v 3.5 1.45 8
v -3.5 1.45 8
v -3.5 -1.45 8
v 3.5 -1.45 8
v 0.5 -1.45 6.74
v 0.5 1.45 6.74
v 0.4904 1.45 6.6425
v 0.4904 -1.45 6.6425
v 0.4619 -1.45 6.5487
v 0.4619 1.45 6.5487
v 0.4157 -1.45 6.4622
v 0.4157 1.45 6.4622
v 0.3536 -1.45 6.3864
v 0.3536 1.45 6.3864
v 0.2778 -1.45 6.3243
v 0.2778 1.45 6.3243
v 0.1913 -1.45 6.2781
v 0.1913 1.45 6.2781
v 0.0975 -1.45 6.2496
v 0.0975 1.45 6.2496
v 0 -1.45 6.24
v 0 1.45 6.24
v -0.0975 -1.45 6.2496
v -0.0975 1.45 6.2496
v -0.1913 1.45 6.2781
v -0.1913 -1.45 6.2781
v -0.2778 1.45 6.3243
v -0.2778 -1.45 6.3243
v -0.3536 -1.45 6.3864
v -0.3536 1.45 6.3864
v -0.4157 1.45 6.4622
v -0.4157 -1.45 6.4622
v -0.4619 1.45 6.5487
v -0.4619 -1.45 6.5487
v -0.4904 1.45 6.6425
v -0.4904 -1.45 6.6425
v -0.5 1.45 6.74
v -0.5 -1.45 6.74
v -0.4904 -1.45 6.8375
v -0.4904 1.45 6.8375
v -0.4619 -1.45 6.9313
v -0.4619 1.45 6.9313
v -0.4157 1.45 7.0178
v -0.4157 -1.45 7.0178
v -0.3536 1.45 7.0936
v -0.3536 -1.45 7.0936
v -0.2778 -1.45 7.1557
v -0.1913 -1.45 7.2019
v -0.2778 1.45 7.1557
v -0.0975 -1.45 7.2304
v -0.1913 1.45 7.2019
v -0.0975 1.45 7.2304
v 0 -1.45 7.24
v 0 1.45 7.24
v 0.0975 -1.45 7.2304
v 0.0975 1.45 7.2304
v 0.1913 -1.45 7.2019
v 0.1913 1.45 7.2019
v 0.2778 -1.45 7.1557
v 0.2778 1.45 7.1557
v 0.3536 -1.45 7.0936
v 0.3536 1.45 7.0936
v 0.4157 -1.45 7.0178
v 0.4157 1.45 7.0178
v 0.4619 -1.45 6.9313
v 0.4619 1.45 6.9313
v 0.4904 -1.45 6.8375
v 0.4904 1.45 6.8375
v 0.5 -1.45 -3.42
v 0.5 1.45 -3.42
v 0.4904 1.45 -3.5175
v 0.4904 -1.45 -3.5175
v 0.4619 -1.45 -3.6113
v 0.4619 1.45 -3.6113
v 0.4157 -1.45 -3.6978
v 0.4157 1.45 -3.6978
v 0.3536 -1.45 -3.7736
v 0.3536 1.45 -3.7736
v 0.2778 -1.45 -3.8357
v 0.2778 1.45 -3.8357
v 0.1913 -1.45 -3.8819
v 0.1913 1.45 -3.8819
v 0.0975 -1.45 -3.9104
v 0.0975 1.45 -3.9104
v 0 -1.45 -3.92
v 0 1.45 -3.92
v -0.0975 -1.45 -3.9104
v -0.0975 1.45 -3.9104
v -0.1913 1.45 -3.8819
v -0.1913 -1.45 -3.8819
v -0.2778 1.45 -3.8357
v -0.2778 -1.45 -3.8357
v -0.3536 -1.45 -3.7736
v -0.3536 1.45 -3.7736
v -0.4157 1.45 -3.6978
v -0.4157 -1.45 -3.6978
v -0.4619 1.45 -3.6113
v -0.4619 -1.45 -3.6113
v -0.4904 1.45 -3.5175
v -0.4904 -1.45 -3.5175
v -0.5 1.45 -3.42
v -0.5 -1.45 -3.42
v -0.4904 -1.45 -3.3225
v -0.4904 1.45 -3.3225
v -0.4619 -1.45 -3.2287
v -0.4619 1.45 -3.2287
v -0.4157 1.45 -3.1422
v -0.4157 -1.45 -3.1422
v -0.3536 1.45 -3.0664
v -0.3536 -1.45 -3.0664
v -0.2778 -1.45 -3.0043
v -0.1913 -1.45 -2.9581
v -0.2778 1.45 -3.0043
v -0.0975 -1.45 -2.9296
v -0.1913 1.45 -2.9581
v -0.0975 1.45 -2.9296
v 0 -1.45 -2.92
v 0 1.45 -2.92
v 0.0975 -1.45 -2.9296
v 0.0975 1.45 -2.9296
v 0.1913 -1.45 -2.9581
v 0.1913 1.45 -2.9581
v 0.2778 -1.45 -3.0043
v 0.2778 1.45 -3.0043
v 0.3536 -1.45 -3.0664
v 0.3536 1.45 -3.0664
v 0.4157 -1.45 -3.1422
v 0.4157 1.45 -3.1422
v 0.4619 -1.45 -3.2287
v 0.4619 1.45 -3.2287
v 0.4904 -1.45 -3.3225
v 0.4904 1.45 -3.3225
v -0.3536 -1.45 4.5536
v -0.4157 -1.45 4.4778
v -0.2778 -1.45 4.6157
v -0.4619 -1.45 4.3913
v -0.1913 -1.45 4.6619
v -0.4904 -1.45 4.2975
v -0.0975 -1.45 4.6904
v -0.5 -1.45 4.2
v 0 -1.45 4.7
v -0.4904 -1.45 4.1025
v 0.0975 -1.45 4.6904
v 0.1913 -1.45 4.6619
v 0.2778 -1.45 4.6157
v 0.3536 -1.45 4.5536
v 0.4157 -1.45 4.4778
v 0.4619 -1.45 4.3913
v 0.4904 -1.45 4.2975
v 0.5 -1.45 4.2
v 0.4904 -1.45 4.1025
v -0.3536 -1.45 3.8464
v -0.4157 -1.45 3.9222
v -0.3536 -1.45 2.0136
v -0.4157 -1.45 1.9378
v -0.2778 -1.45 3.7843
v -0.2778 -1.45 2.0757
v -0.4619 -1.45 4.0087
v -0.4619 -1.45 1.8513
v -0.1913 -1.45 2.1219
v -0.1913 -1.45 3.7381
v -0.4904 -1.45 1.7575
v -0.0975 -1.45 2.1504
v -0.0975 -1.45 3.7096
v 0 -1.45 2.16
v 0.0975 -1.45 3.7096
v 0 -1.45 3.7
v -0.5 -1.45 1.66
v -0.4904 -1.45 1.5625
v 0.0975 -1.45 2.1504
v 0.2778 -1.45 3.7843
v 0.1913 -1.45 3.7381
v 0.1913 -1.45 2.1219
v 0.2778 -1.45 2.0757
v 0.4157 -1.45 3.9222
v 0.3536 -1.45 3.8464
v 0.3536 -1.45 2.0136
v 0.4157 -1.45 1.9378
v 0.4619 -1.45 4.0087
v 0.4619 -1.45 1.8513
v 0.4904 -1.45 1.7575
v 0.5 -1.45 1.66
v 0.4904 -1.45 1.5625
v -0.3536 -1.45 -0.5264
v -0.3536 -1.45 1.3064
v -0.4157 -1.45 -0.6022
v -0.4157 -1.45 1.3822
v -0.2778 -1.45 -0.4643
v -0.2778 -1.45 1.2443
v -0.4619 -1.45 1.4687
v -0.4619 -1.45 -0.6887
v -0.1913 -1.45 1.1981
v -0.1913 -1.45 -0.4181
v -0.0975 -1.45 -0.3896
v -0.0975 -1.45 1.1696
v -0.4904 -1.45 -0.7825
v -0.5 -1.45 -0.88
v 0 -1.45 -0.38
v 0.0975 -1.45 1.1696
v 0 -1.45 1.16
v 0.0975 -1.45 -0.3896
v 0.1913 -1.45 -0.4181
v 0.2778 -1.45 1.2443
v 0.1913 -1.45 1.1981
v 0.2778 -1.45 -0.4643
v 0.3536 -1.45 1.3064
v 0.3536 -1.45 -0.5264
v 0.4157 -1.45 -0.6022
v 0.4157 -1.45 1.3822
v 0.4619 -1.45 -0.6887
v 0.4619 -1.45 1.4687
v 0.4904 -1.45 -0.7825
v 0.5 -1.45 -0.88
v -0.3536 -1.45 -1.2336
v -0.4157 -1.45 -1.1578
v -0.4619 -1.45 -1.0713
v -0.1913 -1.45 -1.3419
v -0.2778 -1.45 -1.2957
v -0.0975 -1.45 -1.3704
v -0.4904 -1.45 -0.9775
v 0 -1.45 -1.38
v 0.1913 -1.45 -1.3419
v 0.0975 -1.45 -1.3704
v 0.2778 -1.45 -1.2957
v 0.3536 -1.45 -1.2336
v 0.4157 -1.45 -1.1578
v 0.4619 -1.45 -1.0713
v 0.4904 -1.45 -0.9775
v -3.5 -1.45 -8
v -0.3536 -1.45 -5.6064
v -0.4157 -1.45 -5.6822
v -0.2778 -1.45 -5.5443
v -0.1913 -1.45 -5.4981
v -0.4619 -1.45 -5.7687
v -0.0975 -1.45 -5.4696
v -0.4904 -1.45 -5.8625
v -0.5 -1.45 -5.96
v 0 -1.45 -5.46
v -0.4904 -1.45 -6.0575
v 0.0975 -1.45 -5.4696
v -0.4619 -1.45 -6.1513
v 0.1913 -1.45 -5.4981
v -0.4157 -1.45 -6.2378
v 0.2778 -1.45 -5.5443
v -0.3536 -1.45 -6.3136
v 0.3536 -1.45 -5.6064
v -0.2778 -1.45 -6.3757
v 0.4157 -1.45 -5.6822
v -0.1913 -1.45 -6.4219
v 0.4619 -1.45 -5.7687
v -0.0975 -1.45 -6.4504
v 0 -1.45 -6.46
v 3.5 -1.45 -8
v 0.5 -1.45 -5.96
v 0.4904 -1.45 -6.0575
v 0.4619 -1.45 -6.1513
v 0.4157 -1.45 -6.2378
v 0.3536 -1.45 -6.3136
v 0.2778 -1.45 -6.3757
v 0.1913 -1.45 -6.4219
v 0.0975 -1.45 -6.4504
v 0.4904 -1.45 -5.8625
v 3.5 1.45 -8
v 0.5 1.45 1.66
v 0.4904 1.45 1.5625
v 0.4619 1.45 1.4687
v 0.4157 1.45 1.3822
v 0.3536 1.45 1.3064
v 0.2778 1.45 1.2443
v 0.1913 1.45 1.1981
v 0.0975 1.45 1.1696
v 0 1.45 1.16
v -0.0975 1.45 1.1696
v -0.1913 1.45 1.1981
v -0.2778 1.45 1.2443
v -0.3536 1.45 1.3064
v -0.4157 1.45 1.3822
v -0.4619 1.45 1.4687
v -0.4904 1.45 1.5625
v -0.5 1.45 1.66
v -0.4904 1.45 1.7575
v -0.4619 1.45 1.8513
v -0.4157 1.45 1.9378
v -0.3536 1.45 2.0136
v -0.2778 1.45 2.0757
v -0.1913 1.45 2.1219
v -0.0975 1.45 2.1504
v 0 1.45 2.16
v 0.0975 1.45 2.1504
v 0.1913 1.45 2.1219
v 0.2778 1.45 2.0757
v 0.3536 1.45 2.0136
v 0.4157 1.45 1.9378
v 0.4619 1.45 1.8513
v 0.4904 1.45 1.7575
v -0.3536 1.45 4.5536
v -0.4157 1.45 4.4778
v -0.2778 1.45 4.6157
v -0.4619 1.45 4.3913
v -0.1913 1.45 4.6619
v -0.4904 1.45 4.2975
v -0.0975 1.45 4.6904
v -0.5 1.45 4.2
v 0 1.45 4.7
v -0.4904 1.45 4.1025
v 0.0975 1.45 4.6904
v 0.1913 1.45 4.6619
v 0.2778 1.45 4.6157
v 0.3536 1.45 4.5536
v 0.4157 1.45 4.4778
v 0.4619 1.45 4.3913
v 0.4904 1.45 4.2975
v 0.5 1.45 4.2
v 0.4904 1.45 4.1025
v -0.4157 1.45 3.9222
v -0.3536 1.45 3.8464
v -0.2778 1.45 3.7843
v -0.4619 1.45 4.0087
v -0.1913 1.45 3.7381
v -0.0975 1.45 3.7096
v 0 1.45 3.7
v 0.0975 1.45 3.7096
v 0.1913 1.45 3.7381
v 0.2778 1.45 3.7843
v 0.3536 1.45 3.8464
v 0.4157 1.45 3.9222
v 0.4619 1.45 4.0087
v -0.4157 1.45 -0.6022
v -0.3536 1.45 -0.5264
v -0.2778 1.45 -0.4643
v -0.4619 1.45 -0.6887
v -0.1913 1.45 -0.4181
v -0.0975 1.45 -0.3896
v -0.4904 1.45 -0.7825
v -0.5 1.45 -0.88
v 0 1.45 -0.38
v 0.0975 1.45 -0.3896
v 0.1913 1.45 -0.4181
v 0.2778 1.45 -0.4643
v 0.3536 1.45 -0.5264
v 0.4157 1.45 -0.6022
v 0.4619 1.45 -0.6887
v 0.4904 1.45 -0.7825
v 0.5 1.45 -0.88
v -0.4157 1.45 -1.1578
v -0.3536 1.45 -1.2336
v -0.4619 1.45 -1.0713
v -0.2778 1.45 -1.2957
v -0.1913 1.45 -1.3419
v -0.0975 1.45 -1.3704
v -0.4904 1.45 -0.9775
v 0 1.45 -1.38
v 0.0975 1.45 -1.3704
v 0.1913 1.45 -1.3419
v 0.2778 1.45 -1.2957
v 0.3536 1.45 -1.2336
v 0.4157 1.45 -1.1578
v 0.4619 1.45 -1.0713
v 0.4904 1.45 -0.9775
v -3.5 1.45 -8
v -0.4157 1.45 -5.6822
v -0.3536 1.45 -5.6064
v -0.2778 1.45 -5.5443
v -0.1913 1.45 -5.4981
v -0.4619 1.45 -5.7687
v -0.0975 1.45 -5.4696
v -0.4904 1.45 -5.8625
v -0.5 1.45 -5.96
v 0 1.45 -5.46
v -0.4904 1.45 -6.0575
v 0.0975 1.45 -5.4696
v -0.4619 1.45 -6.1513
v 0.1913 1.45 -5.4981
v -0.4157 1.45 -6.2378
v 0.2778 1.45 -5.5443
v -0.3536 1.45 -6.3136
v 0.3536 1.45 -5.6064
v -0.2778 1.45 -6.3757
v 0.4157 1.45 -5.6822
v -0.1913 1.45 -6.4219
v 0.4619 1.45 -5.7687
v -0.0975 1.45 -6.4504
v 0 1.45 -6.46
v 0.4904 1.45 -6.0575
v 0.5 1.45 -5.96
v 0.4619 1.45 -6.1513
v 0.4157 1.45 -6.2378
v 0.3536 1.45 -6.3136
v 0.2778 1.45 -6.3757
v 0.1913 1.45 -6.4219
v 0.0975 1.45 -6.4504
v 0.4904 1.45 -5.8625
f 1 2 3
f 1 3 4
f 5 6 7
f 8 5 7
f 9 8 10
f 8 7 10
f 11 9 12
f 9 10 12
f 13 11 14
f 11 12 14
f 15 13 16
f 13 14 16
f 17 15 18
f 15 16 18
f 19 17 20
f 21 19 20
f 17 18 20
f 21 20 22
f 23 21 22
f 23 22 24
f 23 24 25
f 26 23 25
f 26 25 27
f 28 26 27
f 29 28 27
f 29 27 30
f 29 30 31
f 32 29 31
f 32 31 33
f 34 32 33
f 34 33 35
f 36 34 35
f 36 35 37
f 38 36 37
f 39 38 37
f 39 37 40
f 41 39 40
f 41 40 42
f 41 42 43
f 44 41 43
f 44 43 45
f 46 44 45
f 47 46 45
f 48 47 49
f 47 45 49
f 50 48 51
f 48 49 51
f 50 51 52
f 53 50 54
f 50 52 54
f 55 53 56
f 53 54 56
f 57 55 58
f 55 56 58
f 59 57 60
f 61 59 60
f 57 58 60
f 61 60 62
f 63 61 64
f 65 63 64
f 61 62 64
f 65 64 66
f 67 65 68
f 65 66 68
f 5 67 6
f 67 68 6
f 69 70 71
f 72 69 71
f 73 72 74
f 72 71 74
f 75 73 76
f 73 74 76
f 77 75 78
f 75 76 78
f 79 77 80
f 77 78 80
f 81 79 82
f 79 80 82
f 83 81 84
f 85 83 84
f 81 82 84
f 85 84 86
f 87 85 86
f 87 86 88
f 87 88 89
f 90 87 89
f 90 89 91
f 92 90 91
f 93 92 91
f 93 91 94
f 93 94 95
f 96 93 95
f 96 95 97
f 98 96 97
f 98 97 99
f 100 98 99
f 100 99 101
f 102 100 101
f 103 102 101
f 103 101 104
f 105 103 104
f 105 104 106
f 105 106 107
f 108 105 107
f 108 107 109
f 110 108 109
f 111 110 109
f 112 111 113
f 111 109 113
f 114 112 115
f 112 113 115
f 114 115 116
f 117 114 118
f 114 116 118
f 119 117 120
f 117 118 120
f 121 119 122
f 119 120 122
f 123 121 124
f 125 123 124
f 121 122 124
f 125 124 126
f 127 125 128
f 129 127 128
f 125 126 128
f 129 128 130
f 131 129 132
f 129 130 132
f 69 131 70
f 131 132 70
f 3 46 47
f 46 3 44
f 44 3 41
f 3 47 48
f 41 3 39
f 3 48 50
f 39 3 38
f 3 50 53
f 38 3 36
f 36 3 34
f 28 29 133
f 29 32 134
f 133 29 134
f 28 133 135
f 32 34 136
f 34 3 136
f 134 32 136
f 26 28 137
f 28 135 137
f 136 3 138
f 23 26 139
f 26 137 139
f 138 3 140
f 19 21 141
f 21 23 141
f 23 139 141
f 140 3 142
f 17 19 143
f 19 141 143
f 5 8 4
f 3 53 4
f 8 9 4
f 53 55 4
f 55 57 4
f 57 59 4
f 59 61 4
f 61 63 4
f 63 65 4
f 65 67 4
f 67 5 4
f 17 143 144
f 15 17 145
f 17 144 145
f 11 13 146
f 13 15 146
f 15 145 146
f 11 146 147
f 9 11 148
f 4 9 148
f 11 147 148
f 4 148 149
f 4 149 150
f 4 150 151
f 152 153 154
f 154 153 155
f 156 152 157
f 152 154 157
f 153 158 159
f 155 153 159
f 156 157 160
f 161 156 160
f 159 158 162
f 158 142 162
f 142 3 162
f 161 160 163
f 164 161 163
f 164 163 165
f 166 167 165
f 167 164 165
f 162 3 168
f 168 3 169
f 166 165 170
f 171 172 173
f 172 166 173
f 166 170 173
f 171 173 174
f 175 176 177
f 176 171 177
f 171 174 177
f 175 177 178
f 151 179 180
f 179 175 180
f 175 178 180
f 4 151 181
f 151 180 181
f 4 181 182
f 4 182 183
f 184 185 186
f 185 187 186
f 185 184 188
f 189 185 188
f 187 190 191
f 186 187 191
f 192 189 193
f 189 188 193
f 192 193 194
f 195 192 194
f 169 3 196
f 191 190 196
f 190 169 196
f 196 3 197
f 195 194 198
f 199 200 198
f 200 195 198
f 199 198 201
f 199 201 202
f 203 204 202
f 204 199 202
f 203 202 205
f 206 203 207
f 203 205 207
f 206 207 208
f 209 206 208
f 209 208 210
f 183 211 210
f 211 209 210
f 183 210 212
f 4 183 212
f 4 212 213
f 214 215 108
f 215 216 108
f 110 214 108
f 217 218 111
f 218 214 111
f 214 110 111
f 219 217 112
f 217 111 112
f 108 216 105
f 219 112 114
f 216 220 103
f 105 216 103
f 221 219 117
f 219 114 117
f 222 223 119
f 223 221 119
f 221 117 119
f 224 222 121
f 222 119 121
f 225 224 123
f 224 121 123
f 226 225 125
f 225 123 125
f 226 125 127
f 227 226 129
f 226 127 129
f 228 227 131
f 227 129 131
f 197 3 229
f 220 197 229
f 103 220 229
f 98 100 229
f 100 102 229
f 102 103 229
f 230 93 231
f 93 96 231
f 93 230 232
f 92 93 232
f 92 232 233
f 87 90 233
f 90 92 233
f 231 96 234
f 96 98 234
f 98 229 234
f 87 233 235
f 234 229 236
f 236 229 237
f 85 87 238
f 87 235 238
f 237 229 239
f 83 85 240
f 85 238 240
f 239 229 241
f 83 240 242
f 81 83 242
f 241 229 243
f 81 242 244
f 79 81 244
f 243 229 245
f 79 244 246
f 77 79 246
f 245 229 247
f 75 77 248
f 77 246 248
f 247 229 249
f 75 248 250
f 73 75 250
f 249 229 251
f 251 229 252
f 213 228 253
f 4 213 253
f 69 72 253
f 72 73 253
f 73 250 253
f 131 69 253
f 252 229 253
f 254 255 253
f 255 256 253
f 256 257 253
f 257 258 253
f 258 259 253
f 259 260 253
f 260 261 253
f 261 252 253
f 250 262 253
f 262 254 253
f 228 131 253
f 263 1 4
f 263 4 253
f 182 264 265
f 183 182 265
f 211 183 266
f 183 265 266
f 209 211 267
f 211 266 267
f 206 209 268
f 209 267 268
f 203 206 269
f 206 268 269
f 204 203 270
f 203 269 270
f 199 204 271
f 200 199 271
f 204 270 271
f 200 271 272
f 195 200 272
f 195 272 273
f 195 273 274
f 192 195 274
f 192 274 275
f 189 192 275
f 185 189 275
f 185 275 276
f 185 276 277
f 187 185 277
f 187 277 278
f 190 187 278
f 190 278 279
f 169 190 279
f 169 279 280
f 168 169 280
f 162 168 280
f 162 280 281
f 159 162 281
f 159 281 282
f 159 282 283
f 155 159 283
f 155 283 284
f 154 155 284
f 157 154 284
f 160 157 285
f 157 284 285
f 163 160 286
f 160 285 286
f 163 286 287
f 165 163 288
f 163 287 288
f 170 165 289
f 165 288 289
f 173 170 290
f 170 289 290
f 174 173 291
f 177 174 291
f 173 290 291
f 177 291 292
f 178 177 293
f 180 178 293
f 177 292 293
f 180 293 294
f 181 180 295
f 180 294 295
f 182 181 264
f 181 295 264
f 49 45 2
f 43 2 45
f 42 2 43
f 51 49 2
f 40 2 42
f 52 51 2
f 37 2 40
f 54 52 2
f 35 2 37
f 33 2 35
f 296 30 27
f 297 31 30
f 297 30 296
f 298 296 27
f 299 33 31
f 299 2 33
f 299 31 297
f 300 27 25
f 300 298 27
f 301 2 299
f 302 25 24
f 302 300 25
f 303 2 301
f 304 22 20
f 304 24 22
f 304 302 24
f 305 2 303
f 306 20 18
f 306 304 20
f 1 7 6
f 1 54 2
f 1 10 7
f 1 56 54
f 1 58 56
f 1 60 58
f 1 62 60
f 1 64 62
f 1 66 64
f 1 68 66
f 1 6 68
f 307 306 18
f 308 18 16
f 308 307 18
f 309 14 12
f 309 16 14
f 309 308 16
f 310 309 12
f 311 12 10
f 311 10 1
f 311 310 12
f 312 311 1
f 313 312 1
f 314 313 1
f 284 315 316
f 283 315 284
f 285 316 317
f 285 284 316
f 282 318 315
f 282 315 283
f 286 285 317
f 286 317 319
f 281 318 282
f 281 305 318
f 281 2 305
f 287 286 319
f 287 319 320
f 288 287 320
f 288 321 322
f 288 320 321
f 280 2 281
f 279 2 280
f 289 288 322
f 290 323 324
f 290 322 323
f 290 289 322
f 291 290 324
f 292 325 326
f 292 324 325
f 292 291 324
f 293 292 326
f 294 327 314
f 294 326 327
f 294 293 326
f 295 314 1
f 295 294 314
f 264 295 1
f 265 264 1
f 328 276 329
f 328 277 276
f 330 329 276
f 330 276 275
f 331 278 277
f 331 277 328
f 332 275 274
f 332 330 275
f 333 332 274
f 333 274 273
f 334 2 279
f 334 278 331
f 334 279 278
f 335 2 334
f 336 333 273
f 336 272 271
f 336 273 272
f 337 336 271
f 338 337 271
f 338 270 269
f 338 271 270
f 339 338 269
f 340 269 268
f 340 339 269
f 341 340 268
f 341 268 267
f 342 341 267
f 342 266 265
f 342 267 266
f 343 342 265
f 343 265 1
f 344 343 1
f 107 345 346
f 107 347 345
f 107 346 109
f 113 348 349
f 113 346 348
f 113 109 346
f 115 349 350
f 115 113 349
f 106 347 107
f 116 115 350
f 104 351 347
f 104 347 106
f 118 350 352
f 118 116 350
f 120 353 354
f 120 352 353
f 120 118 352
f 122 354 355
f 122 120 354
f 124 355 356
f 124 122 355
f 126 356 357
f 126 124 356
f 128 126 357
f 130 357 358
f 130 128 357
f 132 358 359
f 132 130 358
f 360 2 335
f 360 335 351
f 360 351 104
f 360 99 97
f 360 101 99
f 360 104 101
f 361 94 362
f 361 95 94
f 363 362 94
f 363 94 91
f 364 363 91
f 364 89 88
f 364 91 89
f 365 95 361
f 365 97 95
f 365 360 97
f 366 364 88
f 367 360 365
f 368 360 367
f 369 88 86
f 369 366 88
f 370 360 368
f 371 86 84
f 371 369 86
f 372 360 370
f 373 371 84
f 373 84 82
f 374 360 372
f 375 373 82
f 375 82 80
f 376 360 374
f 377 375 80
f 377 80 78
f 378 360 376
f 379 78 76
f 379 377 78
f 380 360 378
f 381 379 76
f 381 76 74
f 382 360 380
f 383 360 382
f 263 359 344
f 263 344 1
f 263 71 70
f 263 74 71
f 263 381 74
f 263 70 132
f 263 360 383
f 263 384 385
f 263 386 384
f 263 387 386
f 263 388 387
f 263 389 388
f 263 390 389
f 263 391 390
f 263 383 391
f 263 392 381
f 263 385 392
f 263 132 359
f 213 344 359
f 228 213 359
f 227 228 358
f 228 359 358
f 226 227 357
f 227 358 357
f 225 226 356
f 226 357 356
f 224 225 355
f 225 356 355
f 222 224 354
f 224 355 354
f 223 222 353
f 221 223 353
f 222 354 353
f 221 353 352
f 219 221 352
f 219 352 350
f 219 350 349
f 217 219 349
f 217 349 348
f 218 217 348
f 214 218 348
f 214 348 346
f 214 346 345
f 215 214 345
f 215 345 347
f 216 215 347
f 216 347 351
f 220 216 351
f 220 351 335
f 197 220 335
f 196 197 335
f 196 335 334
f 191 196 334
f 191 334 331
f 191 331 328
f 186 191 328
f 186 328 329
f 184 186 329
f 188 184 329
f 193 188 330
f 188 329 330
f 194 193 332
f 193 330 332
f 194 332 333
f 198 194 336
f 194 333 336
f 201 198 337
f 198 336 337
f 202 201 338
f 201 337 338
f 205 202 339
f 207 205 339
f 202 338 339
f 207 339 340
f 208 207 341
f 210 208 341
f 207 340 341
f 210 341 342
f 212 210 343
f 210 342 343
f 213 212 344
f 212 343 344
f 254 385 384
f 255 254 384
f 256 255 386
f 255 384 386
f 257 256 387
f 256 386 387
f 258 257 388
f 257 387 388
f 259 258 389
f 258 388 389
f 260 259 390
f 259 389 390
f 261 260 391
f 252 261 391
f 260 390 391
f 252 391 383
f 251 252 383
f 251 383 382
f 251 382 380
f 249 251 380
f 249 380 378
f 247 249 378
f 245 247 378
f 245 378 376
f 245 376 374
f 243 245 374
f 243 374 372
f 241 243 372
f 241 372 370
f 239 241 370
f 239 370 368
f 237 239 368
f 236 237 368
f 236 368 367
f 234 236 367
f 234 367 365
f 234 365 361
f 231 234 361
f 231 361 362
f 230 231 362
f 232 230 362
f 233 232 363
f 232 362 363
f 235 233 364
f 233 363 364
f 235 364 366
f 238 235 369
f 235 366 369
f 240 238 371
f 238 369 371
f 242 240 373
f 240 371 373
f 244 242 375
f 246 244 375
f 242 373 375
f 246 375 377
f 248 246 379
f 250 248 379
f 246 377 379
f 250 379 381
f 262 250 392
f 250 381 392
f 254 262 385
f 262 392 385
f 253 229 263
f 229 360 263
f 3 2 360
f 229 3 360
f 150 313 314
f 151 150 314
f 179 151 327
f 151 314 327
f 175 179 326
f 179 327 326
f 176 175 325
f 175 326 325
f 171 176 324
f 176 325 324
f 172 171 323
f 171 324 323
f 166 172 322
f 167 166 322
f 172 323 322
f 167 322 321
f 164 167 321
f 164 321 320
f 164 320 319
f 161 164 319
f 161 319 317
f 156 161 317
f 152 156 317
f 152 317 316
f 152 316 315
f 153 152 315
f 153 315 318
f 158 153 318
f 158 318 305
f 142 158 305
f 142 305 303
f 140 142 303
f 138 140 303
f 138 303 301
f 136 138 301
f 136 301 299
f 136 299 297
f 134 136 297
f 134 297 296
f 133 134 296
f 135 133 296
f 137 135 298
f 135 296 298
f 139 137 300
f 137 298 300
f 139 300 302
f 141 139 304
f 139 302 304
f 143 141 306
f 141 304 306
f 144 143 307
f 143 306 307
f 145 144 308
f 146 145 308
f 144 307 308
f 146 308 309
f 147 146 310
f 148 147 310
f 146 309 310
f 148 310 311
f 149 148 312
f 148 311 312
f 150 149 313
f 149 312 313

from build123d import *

# Parameters (mm, degrees)
SKETCH1_W           = 7
SKETCH1_H           = 16
BOSS_EXTRUDE1_DEPTH = 1.45
SKETCH2_R           = 0.5
CUT_EXTRUDE1_DEPTH  = 3.9
LPATTERN1_COUNT     = 12
LPATTERN1_PITCH     = 2.54


with BuildPart() as part:
    # Sketch1 → Boss-Extrude1 (new body, symmetric)
    with BuildSketch(Plane(origin=(0, 0, 0), x_dir=(1, 0, 0), z_dir=(0, 1, 0))):
        Rectangle(SKETCH1_W, SKETCH1_H)
    extrude(amount=BOSS_EXTRUDE1_DEPTH, both=True)

    # Sketch2 → Cut-Extrude1 (cut, through all)
    with BuildSketch(Plane(origin=(0, 1.45, 0), x_dir=(1, 0, 0), z_dir=(0, 1, 0))):
        with Locations((0, 5.96)):
            Circle(SKETCH2_R)
    cut_extrude1 = extrude(amount=-CUT_EXTRUDE1_DEPTH, mode=Mode.SUBTRACT)

    # LPattern1: Cut-Extrude1 ×12
    with Locations(*[(0, 0, i * LPATTERN1_PITCH) for i in range(1, LPATTERN1_COUNT)]):
        add(cut_extrude1, mode=Mode.SUBTRACT)


solid = part.part
